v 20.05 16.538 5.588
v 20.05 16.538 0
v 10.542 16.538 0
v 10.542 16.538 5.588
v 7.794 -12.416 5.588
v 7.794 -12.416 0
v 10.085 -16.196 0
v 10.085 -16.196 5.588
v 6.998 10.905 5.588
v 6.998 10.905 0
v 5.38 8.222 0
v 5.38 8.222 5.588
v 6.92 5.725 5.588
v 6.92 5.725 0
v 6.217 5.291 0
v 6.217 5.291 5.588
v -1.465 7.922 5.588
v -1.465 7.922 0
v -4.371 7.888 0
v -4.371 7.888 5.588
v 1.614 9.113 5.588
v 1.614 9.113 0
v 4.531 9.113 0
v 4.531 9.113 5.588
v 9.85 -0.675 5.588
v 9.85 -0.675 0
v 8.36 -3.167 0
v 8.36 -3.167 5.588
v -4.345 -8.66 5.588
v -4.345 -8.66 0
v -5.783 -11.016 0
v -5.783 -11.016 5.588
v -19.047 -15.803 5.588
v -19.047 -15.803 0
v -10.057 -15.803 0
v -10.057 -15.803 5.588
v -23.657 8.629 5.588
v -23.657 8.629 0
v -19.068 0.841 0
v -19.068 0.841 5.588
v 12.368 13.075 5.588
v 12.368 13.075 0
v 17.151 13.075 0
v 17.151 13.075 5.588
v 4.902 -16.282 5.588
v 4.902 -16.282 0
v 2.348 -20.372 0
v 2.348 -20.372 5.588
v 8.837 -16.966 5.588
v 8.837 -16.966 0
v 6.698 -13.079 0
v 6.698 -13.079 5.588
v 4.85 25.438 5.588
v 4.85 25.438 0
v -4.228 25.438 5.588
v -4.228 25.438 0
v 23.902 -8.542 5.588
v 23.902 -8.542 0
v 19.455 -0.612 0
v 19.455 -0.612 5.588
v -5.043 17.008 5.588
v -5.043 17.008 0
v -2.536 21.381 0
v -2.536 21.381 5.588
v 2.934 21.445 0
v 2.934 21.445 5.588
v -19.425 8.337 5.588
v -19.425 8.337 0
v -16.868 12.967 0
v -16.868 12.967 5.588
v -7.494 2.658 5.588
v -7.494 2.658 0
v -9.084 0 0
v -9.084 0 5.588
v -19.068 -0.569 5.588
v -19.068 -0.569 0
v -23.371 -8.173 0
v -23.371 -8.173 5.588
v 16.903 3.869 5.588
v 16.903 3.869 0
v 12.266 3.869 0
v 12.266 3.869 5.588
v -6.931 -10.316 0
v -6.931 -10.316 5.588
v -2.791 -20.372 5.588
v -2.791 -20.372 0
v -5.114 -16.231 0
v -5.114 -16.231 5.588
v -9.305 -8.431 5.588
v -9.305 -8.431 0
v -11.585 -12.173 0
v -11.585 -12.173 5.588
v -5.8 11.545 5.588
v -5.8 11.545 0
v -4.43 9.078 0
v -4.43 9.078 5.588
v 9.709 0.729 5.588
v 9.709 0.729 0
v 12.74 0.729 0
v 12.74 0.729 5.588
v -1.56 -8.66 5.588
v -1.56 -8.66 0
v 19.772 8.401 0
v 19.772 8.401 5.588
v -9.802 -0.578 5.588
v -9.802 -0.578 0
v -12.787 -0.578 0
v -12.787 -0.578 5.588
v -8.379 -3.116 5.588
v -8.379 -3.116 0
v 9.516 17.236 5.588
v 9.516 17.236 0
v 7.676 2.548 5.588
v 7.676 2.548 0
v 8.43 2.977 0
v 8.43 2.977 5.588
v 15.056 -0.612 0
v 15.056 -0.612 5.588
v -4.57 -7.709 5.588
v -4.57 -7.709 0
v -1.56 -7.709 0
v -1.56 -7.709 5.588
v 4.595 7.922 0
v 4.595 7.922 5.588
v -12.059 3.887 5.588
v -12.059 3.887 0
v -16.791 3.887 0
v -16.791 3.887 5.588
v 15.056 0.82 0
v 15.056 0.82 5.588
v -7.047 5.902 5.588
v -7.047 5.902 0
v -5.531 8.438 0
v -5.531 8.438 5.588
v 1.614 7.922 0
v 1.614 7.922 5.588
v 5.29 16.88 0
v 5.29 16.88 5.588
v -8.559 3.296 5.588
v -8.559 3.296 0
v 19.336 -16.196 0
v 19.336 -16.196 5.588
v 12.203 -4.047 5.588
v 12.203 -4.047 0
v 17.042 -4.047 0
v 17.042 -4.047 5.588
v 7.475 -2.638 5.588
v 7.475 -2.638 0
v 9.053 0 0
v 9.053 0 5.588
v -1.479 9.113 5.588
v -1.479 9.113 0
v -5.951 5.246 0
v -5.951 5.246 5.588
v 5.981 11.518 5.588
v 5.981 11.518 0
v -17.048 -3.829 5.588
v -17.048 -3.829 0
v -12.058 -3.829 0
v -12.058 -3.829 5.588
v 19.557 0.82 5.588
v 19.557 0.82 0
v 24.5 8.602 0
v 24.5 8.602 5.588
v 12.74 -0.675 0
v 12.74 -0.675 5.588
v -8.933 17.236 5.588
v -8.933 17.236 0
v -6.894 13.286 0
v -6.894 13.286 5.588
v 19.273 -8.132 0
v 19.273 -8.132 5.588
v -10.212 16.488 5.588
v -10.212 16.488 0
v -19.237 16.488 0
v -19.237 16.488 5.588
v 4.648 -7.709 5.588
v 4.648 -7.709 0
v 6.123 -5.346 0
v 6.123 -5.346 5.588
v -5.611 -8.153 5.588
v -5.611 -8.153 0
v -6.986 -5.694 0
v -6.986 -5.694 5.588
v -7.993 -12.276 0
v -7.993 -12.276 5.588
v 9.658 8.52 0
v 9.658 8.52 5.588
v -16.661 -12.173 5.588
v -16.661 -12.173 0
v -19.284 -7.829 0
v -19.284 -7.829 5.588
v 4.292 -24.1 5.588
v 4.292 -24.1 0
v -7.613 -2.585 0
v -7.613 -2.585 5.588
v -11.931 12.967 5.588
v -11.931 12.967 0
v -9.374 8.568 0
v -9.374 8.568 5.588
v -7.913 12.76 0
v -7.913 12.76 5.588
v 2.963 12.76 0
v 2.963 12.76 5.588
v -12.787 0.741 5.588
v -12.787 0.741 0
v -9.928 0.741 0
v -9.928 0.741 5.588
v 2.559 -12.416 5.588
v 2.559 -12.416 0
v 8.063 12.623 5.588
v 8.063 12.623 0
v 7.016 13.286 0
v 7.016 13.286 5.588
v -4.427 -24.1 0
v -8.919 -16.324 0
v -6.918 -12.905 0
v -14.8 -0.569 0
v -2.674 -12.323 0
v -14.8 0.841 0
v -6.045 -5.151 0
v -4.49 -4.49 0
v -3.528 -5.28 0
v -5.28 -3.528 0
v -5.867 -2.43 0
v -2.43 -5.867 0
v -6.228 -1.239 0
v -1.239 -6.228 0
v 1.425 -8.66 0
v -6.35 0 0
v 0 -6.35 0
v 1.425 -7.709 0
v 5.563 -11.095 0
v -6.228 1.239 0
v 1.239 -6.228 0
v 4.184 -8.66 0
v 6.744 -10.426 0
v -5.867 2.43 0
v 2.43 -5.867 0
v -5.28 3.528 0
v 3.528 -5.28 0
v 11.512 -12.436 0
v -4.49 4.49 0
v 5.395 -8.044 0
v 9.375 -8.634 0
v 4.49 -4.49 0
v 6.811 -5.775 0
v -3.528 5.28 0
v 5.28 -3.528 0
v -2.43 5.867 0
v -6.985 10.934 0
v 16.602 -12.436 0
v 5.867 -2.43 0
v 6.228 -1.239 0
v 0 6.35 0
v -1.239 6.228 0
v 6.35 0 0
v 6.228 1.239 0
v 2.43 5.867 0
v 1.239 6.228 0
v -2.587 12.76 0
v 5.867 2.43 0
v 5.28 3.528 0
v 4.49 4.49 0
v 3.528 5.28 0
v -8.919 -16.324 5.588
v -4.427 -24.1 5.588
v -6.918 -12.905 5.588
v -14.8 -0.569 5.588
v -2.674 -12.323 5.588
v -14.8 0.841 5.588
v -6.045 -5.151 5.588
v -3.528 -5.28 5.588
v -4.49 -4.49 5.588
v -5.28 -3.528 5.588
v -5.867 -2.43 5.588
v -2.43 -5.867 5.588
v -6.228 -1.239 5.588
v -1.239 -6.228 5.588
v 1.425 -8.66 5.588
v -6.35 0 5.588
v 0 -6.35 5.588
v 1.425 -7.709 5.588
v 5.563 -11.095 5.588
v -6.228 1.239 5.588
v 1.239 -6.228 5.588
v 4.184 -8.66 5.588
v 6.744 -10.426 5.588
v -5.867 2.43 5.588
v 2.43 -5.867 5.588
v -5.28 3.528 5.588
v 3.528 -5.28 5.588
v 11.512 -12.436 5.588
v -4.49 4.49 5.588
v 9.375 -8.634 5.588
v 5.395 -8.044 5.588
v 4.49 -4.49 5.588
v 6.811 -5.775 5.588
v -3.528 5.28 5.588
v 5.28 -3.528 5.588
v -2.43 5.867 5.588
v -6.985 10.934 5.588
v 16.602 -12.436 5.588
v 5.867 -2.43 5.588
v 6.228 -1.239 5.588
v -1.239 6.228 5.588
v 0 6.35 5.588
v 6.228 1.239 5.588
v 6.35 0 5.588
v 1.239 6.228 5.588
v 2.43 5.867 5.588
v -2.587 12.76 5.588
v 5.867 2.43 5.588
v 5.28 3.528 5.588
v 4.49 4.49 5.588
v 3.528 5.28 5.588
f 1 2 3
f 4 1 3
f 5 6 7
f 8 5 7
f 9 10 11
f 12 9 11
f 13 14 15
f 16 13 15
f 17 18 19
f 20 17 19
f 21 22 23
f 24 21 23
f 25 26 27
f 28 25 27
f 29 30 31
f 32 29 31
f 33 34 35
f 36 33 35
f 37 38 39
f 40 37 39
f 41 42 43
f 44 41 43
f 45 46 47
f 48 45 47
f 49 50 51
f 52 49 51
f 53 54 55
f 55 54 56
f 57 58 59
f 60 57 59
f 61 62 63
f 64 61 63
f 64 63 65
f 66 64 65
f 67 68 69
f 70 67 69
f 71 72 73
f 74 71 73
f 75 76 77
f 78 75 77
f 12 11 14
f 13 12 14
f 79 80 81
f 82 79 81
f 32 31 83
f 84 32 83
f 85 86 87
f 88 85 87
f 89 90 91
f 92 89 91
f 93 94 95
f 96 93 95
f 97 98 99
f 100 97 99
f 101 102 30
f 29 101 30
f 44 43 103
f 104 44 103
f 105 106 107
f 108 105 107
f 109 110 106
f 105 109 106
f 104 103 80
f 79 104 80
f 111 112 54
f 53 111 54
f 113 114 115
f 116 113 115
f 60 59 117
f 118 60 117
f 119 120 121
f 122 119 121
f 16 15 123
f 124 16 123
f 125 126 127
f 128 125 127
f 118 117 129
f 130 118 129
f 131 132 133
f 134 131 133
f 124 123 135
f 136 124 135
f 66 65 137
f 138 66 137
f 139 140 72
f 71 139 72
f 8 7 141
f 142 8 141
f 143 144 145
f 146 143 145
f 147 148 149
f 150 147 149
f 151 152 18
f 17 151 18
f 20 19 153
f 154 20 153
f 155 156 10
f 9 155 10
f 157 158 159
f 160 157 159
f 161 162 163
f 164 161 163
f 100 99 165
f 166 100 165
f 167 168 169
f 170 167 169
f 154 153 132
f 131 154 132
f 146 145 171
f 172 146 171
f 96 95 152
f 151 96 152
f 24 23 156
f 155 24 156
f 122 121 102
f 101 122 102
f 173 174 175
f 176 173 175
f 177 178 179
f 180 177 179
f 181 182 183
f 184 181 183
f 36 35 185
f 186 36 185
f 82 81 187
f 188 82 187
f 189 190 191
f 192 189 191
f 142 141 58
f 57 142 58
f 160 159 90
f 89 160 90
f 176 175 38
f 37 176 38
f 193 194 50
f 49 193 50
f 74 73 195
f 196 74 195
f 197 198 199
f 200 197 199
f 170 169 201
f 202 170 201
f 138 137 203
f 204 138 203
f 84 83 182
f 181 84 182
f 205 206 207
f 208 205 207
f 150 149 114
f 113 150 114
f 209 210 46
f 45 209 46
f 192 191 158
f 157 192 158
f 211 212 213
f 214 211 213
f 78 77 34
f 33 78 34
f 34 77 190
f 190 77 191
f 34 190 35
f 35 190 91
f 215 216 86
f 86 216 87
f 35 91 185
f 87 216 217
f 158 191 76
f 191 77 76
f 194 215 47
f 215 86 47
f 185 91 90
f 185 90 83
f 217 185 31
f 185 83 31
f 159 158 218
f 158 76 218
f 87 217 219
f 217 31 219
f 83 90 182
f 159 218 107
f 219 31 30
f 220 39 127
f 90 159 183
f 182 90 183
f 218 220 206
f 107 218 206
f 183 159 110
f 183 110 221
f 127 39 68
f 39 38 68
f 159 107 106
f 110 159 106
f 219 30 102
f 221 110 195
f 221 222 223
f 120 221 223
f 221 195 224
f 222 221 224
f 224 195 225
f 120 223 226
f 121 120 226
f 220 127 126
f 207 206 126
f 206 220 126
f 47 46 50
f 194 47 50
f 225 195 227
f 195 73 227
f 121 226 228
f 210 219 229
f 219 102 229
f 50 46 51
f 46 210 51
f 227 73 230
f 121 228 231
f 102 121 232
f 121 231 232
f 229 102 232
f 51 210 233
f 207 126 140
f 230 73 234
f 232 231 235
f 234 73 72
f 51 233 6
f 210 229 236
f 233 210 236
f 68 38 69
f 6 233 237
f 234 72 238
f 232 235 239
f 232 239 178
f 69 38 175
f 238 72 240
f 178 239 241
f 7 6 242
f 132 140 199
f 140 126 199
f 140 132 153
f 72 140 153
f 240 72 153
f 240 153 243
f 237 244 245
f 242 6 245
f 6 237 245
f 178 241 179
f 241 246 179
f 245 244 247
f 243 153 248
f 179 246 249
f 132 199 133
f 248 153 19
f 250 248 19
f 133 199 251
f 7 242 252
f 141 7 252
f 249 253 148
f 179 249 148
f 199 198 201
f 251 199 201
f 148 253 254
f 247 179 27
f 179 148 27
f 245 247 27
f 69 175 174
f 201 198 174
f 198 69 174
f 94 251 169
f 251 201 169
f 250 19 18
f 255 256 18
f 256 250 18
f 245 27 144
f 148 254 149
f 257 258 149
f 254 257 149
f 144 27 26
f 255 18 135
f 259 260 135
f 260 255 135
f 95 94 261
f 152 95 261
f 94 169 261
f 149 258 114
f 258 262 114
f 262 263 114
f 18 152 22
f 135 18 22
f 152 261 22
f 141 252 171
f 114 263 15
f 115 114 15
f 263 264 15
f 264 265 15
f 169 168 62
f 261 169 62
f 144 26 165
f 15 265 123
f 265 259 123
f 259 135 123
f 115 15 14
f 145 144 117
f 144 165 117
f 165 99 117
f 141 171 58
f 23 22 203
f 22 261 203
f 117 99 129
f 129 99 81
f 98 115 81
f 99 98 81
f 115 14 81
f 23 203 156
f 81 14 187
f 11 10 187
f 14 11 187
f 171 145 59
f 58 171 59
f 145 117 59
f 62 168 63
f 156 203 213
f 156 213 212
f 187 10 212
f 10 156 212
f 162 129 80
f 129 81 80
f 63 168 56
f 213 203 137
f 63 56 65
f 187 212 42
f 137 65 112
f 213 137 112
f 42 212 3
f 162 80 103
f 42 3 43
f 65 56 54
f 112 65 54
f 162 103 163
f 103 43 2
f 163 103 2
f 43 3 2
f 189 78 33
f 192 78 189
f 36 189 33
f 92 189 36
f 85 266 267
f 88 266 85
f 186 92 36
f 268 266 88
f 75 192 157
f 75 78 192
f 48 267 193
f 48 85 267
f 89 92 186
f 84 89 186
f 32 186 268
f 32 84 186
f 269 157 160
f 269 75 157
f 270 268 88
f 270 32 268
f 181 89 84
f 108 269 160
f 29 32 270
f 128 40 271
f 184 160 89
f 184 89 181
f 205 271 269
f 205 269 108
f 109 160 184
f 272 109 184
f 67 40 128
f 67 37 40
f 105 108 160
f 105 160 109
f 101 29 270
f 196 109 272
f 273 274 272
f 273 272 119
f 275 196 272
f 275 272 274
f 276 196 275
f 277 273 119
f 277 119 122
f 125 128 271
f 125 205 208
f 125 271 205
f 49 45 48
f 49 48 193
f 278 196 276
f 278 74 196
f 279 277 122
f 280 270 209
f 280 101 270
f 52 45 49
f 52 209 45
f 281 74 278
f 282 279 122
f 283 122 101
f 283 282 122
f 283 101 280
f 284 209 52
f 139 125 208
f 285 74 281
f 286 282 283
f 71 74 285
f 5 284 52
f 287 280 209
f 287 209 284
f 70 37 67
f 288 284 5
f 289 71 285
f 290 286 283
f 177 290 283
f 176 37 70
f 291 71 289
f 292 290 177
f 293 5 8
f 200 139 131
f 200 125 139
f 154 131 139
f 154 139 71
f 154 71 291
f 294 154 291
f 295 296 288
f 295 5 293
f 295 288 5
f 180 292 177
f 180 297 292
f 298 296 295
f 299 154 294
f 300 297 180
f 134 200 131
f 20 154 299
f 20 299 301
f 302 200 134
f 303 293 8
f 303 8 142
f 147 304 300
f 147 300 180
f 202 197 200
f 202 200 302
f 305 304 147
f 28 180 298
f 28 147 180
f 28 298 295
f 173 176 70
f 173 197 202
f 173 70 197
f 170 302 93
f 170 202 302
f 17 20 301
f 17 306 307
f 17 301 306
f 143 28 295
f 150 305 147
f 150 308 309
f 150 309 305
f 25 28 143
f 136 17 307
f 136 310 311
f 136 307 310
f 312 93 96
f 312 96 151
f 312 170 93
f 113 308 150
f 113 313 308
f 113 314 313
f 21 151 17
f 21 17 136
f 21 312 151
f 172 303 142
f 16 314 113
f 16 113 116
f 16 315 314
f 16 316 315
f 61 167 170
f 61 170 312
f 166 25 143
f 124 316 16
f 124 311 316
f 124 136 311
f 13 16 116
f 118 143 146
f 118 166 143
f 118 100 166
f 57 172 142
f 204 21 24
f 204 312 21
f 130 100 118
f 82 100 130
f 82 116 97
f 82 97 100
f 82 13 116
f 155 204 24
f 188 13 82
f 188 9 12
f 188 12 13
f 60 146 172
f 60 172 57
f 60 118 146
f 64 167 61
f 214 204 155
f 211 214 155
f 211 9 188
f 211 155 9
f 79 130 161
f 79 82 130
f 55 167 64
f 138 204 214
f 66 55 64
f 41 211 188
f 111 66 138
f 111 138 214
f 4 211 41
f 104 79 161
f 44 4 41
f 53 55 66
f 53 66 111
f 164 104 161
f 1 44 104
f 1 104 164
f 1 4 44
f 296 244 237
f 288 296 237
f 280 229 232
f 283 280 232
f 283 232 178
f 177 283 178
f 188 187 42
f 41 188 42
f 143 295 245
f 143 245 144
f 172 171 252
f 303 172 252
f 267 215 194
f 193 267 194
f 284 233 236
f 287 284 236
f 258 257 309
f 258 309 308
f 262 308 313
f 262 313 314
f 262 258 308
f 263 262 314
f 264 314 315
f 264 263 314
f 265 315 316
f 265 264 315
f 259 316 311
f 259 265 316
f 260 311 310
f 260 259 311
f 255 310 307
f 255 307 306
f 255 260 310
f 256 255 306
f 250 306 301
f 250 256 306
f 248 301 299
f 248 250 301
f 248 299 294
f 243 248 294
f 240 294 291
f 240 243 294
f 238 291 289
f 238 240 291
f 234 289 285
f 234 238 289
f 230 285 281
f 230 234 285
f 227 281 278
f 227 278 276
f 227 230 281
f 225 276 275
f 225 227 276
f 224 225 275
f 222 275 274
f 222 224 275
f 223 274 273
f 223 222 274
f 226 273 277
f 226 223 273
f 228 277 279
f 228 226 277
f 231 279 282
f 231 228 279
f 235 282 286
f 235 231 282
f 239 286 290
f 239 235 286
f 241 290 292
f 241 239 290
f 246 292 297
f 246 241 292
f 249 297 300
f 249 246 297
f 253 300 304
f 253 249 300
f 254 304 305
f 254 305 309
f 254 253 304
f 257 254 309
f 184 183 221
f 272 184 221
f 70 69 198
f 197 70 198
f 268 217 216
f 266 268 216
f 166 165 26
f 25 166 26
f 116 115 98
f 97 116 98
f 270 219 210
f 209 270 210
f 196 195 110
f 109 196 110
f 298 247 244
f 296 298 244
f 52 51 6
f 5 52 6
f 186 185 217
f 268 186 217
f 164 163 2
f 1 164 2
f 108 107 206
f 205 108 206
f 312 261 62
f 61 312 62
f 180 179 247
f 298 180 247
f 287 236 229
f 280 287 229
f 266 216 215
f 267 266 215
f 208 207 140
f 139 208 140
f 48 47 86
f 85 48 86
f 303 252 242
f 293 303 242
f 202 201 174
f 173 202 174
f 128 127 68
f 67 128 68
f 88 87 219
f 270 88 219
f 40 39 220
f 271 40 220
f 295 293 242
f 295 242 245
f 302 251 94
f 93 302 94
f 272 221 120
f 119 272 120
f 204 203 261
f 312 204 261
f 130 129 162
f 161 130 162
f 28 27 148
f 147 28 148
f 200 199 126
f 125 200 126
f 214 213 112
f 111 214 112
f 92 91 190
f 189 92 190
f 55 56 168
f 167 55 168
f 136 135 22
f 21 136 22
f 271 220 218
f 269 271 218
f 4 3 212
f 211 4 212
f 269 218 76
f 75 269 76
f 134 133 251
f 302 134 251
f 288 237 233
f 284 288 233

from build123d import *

# Parameters (mm, degrees)
F0_R     = 6.35
F1_DEPTH = 5.588


with BuildPart() as f1:
    # F0 (on Top) → F1 (new body)
    with BuildSketch(Plane.XY):
        Polygon((4.850337, 25.437864), (-4.228426, 25.437864), (-8.932546, 17.23641), (-6.893664, 13.286279), (-7.913105, 12.760089), (-10.211582, 16.488041), (-19.236901, 16.488041), (-23.656916, 8.629121), (-19.068447, 0.841377), (-14.800344, 0.841377), (-14.800344, -0.569267), (-19.068447, -0.569267), (-23.370794, -8.173046), (-19.047294, -15.802811), (-10.057353, -15.802811), (-7.992679, -12.275658), (-6.917777, -12.904869), (-8.919305, -16.324146), (-4.42692, -24.100309), (4.292383, -24.100309), (8.836989, -16.966333), (6.698302, -13.079478), (7.793717, -12.41559), (10.084728, -16.195757), (19.335584, -16.195757), (23.902084, -8.542322), (19.454879, -0.61194), (15.055753, -0.61194), (15.055753, 0.820334), (19.557185, 0.820334), (24.500479, 8.602312), (20.0502, 16.538178), (10.541808, 16.538178), (8.063308, 12.623042), (7.015632, 13.286279), (9.516286, 17.23641), align=None)
        Polygon((-2.673527, -12.323262), (2.558765, -12.41559), (4.9019, -16.281761), (2.347577, -20.372302), (-2.791393, -20.372302), (-5.113728, -16.231047), align=None, mode=Mode.SUBTRACT)
        Polygon((-19.284458, -7.828933), (-17.047726, -3.828624), (-12.058095, -3.828624), (-9.305194, -8.431129), (-11.584939, -12.173353), (-16.6606, -12.173353), align=None, mode=Mode.SUBTRACT)
        Polygon((-5.611179, -8.153478), (-6.985654, -5.693893), (-6.045224, -5.151337), (-4.569907, -7.708554), (-1.560098, -7.708554), (-1.560098, -8.659863), (-4.345217, -8.659863), (-5.783097, -11.016389), (-6.930758, -10.316121), align=None, mode=Mode.SUBTRACT)
        Polygon((-9.927894, 0.740779), (-8.559196, 3.295684), (-7.493752, 2.658462), (-9.08373, 0), (-7.612971, -2.58519), (-8.378716, -3.115653), (-9.801803, -0.577965), (-12.786955, -0.577965), (-12.786955, 0.740779), align=None, mode=Mode.SUBTRACT)
        Circle(F0_R, mode=Mode.SUBTRACT)
        Polygon((1.425454, -8.659863), (1.425454, -7.708554), (4.64753, -7.708554), (6.123088, -5.345567), (6.811032, -5.775151), (5.39455, -8.043533), (6.744049, -10.426221), (5.563155, -11.095052), (4.183921, -8.659863), align=None, mode=Mode.SUBTRACT)
        Polygon((9.052756, 0), (7.676018, 2.54796), (8.430281, 2.977073), (9.709381, 0.728767), (12.740129, 0.728767), (12.740129, -0.674656), (9.850005, -0.674656), (8.359578, -3.166668), (7.47518, -2.637726), align=None, mode=Mode.SUBTRACT)
        Polygon((11.511659, -12.436375), (9.375006, -8.634387), (12.20293, -4.046865), (17.041823, -4.046865), (19.272742, -8.131645), (16.601923, -12.436375), align=None, mode=Mode.SUBTRACT)
        Polygon((-19.42525, 8.33735), (-16.867618, 12.966663), (-11.931389, 12.966663), (-9.373757, 8.567536), (-12.05927, 3.887071), (-16.790888, 3.887071), align=None, mode=Mode.SUBTRACT)
        Polygon((-5.531086, 8.437562), (-6.984751, 10.933847), (-5.800158, 11.545281), (-4.429846, 9.078498), (-1.478518, 9.113127), (-1.46454, 7.921814), (-4.370745, 7.887715), (-5.950622, 5.246141), (-7.047472, 5.902147), align=None, mode=Mode.SUBTRACT)
        Polygon((-5.042579, 17.007749), (-2.5361, 21.381299), (2.933688, 21.445477), (5.290253, 16.879867), (2.962808, 12.760089), (-2.587253, 12.760089), align=None, mode=Mode.SUBTRACT)
        Polygon((1.614482, 7.921814), (1.614482, 9.113127), (4.530643, 9.113127), (5.981318, 11.518419), (6.998032, 10.905221), (5.379989, 8.222425), (6.919887, 5.724828), (6.216966, 5.291441), (4.595204, 7.921814), align=None, mode=Mode.SUBTRACT)
        Polygon((9.657924, 8.519574), (12.368077, 13.074742), (17.150848, 13.074742), (19.771752, 8.401072), (16.902813, 3.869183), (12.265772, 3.869183), align=None, mode=Mode.SUBTRACT)
    extrude(amount=F1_DEPTH)


solid = f1.part
